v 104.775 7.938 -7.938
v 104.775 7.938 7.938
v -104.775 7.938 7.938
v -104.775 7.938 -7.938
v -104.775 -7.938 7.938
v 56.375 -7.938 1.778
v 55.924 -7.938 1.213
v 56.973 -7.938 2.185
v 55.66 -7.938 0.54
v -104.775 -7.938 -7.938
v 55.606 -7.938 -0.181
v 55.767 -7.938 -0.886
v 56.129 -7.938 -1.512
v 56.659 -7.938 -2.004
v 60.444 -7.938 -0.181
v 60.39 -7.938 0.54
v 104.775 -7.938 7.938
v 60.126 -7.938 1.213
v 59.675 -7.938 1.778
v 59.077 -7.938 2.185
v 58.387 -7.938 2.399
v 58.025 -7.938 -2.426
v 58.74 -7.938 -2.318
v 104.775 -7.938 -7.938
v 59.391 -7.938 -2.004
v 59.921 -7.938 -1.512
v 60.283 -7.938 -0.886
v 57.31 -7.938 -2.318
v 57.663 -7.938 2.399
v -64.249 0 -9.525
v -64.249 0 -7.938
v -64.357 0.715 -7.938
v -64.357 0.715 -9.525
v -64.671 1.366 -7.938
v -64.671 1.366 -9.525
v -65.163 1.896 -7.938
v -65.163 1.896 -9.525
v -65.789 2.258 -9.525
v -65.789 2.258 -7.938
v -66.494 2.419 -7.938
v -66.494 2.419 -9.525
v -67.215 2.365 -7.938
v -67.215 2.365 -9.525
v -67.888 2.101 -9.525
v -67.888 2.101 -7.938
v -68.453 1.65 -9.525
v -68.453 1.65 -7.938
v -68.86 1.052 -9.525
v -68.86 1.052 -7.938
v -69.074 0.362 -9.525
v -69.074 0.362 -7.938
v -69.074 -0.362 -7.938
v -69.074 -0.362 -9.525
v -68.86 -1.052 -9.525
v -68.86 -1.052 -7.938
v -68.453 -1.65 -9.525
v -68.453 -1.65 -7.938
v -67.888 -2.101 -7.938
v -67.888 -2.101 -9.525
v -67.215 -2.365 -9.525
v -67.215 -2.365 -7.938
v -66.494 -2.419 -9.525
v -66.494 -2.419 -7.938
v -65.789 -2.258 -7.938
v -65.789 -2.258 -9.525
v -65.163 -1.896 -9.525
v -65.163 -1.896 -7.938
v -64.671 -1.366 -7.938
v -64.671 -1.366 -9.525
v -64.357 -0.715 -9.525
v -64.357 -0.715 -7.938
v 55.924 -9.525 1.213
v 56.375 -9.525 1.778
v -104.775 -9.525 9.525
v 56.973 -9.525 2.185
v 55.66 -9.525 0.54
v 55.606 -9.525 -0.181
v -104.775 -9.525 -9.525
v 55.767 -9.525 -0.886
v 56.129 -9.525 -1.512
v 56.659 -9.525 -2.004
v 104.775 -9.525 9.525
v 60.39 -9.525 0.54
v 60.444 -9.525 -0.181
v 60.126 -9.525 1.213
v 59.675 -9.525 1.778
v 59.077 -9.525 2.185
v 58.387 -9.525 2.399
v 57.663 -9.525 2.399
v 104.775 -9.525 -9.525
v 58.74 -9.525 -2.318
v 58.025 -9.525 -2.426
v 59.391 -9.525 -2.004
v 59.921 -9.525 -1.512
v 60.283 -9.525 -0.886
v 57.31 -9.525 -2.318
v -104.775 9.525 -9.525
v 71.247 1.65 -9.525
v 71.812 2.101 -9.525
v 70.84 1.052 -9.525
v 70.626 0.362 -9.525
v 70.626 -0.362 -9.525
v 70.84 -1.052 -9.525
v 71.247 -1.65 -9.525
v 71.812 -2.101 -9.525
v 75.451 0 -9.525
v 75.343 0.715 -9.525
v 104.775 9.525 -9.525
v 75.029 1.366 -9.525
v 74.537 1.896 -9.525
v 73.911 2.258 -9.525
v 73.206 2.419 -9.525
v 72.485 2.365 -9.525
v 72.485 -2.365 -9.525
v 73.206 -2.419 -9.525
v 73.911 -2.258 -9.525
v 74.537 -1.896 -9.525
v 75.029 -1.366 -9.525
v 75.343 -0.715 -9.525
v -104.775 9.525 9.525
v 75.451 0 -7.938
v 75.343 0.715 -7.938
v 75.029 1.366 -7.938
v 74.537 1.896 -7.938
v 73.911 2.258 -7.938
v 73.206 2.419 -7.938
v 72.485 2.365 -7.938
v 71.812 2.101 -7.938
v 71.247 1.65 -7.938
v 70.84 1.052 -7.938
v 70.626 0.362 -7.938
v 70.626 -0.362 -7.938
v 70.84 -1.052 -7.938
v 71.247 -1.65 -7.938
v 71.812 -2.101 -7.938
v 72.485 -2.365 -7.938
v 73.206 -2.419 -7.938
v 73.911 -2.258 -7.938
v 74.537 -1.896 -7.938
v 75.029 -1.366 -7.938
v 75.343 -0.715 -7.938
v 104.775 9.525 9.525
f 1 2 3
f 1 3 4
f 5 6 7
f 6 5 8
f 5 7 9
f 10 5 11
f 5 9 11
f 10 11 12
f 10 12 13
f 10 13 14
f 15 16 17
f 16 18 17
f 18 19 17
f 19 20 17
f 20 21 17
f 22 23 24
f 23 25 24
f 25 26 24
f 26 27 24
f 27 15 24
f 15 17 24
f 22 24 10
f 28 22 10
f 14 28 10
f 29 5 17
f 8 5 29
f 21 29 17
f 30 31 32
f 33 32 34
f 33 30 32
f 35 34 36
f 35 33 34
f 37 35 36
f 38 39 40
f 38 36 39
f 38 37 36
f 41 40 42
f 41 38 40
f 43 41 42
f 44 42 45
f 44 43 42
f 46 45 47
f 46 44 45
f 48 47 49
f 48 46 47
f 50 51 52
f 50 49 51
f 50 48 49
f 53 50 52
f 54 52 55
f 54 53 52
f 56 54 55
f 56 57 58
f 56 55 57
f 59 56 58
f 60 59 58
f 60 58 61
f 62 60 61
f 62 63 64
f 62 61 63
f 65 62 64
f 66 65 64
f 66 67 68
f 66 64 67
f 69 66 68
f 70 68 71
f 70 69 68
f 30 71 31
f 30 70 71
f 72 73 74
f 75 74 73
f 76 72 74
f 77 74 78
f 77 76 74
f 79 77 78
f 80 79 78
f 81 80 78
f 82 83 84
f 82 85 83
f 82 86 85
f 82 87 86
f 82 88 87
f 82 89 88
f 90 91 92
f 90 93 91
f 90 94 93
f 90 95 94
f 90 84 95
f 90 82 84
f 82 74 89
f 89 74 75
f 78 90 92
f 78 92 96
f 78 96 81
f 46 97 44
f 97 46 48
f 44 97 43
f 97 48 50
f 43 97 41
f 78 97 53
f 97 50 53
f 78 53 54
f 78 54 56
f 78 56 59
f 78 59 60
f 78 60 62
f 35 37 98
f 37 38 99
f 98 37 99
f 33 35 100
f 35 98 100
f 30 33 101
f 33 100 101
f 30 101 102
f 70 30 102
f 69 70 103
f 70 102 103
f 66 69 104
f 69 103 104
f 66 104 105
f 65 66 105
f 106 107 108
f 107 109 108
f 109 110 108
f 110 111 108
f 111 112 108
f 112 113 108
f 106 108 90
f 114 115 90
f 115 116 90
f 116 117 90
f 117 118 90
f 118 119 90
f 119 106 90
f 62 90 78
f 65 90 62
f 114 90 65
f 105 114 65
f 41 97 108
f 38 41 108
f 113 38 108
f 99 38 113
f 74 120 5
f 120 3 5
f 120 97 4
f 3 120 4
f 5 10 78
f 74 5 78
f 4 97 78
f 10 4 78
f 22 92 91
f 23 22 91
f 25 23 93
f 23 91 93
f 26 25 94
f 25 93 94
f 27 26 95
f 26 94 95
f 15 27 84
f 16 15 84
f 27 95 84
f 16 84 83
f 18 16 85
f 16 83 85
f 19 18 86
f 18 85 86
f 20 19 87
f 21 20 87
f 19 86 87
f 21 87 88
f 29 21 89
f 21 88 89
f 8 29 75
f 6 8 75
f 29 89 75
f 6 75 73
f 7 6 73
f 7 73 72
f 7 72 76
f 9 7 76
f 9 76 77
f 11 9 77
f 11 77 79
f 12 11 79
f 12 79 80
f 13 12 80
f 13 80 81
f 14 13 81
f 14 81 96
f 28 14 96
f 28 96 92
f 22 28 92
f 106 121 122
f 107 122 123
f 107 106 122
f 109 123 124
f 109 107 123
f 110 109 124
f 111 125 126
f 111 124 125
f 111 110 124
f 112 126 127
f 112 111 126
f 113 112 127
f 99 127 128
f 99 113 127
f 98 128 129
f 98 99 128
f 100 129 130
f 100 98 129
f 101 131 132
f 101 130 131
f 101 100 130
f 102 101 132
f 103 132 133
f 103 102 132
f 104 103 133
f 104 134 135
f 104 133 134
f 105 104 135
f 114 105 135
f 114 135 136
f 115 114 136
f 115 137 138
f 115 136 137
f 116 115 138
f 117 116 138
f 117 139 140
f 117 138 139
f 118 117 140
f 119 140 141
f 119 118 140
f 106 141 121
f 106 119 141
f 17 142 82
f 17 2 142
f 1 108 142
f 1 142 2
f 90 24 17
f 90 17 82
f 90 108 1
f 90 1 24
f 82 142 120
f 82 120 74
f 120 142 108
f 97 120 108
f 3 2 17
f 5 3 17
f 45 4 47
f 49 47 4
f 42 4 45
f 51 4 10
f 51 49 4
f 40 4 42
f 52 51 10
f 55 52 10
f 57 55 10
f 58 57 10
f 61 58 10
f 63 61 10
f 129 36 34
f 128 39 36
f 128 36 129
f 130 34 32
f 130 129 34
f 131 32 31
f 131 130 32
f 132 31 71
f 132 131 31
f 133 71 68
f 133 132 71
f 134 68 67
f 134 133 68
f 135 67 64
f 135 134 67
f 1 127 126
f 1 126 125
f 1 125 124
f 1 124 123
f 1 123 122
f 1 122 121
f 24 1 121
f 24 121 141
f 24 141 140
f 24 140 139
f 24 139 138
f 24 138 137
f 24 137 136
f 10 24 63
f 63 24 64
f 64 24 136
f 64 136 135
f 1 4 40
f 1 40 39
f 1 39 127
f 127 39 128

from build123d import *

# Parameters (mm, degrees)
SKETCH1_W                     = 19.05
SKETCH1_H                     = 19.05
SKETCH1_W_2                   = 15.875
SKETCH1_H_2                   = 15.875
BOSS_EXTRUDE1_DEPTH           = 104.775
SHELFBARMOUNTHOLE_REACH       = 108.918
SKETCH3_R                     = 2.4257
POWERSUPPLY_MOUNT_HOLES_REACH = 108.918
SKETCH4_R                     = 2.4257


with BuildPart() as part:
    # Sketch1 → Boss-Extrude1 (new, symmetric)
    with BuildSketch(Plane(origin=(0, 0, 0), x_dir=(0, -1, 0), z_dir=(1, 0, 0))):
        Rectangle(SKETCH1_W, SKETCH1_H)
        Rectangle(SKETCH1_W_2, SKETCH1_H_2, mode=Mode.SUBTRACT)
    extrude(amount=BOSS_EXTRUDE1_DEPTH, both=True)

    # Sketch3 → ShelfBarMountHole (cut, up to next)
    with BuildSketch(Plane.XZ.offset(9.525), mode=Mode.PRIVATE) as shelfbarmounthole_sk1:
        with Locations(Location((58.025000028, 0, 0), (0, 0, 270))):
            Circle(SKETCH3_R)
    shelfbarmounthole_tool1 = extrude(shelfbarmounthole_sk1.sketch, amount=-SHELFBARMOUNTHOLE_REACH, mode=Mode.PRIVATE) & part.part
    add(shelfbarmounthole_tool1.solids().sort_by_distance((58.025, -9.525, 0))[0], mode=Mode.SUBTRACT)

    # Sketch4 → PowerSupply Mount Holes (cut, up to next)
    with BuildSketch(Plane.XY.offset(-9.525), mode=Mode.PRIVATE) as powersupply_mount_holes_sk1:
        with Locations((-66.675, 0)):
            Circle(SKETCH4_R)
    powersupply_mount_holes_tool1 = extrude(powersupply_mount_holes_sk1.sketch, amount=POWERSUPPLY_MOUNT_HOLES_REACH, mode=Mode.PRIVATE) & part.part
    # Sketch4 → PowerSupply Mount Holes (cut, up to next)
    with BuildSketch(Plane.XY.offset(-9.525), mode=Mode.PRIVATE) as powersupply_mount_holes_sk2:
        with Locations((73.025, 0)):
            Circle(SKETCH4_R)
    powersupply_mount_holes_tool2 = extrude(powersupply_mount_holes_sk2.sketch, amount=POWERSUPPLY_MOUNT_HOLES_REACH, mode=Mode.PRIVATE) & part.part
    add(powersupply_mount_holes_tool1.solids().sort_by_distance((-66.675, 0, -9.525))[0], mode=Mode.SUBTRACT)
    add(powersupply_mount_holes_tool2.solids().sort_by_distance((73.025, 0, -9.525))[0], mode=Mode.SUBTRACT)


solid = part.part
